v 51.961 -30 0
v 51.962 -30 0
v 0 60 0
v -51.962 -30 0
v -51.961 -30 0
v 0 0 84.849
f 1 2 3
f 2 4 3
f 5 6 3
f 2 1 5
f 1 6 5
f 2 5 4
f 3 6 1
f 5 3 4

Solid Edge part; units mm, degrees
sketch "Sketch1" plane through (0, 0, 0) normal (0, 0, 1) x (1, 0, 0)
  line L0 (51.9615, -30) -> (0, 60)
  line L1 (0, 60) -> (-51.9615, -30)
  line L2 (-51.9615, -30) -> (51.9615, -30)
extrude "Protrusion1" add sketch "Sketch1" along normal blind 110
sketch "Sketch2" plane through (0, 15, 110) normal (0, 0, 1) x (-0.5, 0.866, 0)
  line L0 (-64.9519, -22.5) -> (-12.9904, 67.5)
  line L1 (-12.9904, 67.5) -> (38.9711, -22.5)
  line L2 (38.9711, -22.5) -> (-64.9519, -22.5)
extrude "Cutout1" cut sketch "Sketch2" against normal up to vertex (25.1509 mm away)
sketch "Sketch3" plane through (0, 0, 0) normal (1, 0, 0) x (0, 1, 0)
  line L0 (0, 84.8491) -> (-30, 0)
extrude "ExtrudedCutout_2" cut sketch "Sketch3" along normal mid plane 220 material side at (0, -15.0471, 42.4412)
pattern_circular "Pattern1" count 3 over 360 about axis through (0, 0, 84.8491) along (0, 0, -1) of "ExtrudedCutout_2"
